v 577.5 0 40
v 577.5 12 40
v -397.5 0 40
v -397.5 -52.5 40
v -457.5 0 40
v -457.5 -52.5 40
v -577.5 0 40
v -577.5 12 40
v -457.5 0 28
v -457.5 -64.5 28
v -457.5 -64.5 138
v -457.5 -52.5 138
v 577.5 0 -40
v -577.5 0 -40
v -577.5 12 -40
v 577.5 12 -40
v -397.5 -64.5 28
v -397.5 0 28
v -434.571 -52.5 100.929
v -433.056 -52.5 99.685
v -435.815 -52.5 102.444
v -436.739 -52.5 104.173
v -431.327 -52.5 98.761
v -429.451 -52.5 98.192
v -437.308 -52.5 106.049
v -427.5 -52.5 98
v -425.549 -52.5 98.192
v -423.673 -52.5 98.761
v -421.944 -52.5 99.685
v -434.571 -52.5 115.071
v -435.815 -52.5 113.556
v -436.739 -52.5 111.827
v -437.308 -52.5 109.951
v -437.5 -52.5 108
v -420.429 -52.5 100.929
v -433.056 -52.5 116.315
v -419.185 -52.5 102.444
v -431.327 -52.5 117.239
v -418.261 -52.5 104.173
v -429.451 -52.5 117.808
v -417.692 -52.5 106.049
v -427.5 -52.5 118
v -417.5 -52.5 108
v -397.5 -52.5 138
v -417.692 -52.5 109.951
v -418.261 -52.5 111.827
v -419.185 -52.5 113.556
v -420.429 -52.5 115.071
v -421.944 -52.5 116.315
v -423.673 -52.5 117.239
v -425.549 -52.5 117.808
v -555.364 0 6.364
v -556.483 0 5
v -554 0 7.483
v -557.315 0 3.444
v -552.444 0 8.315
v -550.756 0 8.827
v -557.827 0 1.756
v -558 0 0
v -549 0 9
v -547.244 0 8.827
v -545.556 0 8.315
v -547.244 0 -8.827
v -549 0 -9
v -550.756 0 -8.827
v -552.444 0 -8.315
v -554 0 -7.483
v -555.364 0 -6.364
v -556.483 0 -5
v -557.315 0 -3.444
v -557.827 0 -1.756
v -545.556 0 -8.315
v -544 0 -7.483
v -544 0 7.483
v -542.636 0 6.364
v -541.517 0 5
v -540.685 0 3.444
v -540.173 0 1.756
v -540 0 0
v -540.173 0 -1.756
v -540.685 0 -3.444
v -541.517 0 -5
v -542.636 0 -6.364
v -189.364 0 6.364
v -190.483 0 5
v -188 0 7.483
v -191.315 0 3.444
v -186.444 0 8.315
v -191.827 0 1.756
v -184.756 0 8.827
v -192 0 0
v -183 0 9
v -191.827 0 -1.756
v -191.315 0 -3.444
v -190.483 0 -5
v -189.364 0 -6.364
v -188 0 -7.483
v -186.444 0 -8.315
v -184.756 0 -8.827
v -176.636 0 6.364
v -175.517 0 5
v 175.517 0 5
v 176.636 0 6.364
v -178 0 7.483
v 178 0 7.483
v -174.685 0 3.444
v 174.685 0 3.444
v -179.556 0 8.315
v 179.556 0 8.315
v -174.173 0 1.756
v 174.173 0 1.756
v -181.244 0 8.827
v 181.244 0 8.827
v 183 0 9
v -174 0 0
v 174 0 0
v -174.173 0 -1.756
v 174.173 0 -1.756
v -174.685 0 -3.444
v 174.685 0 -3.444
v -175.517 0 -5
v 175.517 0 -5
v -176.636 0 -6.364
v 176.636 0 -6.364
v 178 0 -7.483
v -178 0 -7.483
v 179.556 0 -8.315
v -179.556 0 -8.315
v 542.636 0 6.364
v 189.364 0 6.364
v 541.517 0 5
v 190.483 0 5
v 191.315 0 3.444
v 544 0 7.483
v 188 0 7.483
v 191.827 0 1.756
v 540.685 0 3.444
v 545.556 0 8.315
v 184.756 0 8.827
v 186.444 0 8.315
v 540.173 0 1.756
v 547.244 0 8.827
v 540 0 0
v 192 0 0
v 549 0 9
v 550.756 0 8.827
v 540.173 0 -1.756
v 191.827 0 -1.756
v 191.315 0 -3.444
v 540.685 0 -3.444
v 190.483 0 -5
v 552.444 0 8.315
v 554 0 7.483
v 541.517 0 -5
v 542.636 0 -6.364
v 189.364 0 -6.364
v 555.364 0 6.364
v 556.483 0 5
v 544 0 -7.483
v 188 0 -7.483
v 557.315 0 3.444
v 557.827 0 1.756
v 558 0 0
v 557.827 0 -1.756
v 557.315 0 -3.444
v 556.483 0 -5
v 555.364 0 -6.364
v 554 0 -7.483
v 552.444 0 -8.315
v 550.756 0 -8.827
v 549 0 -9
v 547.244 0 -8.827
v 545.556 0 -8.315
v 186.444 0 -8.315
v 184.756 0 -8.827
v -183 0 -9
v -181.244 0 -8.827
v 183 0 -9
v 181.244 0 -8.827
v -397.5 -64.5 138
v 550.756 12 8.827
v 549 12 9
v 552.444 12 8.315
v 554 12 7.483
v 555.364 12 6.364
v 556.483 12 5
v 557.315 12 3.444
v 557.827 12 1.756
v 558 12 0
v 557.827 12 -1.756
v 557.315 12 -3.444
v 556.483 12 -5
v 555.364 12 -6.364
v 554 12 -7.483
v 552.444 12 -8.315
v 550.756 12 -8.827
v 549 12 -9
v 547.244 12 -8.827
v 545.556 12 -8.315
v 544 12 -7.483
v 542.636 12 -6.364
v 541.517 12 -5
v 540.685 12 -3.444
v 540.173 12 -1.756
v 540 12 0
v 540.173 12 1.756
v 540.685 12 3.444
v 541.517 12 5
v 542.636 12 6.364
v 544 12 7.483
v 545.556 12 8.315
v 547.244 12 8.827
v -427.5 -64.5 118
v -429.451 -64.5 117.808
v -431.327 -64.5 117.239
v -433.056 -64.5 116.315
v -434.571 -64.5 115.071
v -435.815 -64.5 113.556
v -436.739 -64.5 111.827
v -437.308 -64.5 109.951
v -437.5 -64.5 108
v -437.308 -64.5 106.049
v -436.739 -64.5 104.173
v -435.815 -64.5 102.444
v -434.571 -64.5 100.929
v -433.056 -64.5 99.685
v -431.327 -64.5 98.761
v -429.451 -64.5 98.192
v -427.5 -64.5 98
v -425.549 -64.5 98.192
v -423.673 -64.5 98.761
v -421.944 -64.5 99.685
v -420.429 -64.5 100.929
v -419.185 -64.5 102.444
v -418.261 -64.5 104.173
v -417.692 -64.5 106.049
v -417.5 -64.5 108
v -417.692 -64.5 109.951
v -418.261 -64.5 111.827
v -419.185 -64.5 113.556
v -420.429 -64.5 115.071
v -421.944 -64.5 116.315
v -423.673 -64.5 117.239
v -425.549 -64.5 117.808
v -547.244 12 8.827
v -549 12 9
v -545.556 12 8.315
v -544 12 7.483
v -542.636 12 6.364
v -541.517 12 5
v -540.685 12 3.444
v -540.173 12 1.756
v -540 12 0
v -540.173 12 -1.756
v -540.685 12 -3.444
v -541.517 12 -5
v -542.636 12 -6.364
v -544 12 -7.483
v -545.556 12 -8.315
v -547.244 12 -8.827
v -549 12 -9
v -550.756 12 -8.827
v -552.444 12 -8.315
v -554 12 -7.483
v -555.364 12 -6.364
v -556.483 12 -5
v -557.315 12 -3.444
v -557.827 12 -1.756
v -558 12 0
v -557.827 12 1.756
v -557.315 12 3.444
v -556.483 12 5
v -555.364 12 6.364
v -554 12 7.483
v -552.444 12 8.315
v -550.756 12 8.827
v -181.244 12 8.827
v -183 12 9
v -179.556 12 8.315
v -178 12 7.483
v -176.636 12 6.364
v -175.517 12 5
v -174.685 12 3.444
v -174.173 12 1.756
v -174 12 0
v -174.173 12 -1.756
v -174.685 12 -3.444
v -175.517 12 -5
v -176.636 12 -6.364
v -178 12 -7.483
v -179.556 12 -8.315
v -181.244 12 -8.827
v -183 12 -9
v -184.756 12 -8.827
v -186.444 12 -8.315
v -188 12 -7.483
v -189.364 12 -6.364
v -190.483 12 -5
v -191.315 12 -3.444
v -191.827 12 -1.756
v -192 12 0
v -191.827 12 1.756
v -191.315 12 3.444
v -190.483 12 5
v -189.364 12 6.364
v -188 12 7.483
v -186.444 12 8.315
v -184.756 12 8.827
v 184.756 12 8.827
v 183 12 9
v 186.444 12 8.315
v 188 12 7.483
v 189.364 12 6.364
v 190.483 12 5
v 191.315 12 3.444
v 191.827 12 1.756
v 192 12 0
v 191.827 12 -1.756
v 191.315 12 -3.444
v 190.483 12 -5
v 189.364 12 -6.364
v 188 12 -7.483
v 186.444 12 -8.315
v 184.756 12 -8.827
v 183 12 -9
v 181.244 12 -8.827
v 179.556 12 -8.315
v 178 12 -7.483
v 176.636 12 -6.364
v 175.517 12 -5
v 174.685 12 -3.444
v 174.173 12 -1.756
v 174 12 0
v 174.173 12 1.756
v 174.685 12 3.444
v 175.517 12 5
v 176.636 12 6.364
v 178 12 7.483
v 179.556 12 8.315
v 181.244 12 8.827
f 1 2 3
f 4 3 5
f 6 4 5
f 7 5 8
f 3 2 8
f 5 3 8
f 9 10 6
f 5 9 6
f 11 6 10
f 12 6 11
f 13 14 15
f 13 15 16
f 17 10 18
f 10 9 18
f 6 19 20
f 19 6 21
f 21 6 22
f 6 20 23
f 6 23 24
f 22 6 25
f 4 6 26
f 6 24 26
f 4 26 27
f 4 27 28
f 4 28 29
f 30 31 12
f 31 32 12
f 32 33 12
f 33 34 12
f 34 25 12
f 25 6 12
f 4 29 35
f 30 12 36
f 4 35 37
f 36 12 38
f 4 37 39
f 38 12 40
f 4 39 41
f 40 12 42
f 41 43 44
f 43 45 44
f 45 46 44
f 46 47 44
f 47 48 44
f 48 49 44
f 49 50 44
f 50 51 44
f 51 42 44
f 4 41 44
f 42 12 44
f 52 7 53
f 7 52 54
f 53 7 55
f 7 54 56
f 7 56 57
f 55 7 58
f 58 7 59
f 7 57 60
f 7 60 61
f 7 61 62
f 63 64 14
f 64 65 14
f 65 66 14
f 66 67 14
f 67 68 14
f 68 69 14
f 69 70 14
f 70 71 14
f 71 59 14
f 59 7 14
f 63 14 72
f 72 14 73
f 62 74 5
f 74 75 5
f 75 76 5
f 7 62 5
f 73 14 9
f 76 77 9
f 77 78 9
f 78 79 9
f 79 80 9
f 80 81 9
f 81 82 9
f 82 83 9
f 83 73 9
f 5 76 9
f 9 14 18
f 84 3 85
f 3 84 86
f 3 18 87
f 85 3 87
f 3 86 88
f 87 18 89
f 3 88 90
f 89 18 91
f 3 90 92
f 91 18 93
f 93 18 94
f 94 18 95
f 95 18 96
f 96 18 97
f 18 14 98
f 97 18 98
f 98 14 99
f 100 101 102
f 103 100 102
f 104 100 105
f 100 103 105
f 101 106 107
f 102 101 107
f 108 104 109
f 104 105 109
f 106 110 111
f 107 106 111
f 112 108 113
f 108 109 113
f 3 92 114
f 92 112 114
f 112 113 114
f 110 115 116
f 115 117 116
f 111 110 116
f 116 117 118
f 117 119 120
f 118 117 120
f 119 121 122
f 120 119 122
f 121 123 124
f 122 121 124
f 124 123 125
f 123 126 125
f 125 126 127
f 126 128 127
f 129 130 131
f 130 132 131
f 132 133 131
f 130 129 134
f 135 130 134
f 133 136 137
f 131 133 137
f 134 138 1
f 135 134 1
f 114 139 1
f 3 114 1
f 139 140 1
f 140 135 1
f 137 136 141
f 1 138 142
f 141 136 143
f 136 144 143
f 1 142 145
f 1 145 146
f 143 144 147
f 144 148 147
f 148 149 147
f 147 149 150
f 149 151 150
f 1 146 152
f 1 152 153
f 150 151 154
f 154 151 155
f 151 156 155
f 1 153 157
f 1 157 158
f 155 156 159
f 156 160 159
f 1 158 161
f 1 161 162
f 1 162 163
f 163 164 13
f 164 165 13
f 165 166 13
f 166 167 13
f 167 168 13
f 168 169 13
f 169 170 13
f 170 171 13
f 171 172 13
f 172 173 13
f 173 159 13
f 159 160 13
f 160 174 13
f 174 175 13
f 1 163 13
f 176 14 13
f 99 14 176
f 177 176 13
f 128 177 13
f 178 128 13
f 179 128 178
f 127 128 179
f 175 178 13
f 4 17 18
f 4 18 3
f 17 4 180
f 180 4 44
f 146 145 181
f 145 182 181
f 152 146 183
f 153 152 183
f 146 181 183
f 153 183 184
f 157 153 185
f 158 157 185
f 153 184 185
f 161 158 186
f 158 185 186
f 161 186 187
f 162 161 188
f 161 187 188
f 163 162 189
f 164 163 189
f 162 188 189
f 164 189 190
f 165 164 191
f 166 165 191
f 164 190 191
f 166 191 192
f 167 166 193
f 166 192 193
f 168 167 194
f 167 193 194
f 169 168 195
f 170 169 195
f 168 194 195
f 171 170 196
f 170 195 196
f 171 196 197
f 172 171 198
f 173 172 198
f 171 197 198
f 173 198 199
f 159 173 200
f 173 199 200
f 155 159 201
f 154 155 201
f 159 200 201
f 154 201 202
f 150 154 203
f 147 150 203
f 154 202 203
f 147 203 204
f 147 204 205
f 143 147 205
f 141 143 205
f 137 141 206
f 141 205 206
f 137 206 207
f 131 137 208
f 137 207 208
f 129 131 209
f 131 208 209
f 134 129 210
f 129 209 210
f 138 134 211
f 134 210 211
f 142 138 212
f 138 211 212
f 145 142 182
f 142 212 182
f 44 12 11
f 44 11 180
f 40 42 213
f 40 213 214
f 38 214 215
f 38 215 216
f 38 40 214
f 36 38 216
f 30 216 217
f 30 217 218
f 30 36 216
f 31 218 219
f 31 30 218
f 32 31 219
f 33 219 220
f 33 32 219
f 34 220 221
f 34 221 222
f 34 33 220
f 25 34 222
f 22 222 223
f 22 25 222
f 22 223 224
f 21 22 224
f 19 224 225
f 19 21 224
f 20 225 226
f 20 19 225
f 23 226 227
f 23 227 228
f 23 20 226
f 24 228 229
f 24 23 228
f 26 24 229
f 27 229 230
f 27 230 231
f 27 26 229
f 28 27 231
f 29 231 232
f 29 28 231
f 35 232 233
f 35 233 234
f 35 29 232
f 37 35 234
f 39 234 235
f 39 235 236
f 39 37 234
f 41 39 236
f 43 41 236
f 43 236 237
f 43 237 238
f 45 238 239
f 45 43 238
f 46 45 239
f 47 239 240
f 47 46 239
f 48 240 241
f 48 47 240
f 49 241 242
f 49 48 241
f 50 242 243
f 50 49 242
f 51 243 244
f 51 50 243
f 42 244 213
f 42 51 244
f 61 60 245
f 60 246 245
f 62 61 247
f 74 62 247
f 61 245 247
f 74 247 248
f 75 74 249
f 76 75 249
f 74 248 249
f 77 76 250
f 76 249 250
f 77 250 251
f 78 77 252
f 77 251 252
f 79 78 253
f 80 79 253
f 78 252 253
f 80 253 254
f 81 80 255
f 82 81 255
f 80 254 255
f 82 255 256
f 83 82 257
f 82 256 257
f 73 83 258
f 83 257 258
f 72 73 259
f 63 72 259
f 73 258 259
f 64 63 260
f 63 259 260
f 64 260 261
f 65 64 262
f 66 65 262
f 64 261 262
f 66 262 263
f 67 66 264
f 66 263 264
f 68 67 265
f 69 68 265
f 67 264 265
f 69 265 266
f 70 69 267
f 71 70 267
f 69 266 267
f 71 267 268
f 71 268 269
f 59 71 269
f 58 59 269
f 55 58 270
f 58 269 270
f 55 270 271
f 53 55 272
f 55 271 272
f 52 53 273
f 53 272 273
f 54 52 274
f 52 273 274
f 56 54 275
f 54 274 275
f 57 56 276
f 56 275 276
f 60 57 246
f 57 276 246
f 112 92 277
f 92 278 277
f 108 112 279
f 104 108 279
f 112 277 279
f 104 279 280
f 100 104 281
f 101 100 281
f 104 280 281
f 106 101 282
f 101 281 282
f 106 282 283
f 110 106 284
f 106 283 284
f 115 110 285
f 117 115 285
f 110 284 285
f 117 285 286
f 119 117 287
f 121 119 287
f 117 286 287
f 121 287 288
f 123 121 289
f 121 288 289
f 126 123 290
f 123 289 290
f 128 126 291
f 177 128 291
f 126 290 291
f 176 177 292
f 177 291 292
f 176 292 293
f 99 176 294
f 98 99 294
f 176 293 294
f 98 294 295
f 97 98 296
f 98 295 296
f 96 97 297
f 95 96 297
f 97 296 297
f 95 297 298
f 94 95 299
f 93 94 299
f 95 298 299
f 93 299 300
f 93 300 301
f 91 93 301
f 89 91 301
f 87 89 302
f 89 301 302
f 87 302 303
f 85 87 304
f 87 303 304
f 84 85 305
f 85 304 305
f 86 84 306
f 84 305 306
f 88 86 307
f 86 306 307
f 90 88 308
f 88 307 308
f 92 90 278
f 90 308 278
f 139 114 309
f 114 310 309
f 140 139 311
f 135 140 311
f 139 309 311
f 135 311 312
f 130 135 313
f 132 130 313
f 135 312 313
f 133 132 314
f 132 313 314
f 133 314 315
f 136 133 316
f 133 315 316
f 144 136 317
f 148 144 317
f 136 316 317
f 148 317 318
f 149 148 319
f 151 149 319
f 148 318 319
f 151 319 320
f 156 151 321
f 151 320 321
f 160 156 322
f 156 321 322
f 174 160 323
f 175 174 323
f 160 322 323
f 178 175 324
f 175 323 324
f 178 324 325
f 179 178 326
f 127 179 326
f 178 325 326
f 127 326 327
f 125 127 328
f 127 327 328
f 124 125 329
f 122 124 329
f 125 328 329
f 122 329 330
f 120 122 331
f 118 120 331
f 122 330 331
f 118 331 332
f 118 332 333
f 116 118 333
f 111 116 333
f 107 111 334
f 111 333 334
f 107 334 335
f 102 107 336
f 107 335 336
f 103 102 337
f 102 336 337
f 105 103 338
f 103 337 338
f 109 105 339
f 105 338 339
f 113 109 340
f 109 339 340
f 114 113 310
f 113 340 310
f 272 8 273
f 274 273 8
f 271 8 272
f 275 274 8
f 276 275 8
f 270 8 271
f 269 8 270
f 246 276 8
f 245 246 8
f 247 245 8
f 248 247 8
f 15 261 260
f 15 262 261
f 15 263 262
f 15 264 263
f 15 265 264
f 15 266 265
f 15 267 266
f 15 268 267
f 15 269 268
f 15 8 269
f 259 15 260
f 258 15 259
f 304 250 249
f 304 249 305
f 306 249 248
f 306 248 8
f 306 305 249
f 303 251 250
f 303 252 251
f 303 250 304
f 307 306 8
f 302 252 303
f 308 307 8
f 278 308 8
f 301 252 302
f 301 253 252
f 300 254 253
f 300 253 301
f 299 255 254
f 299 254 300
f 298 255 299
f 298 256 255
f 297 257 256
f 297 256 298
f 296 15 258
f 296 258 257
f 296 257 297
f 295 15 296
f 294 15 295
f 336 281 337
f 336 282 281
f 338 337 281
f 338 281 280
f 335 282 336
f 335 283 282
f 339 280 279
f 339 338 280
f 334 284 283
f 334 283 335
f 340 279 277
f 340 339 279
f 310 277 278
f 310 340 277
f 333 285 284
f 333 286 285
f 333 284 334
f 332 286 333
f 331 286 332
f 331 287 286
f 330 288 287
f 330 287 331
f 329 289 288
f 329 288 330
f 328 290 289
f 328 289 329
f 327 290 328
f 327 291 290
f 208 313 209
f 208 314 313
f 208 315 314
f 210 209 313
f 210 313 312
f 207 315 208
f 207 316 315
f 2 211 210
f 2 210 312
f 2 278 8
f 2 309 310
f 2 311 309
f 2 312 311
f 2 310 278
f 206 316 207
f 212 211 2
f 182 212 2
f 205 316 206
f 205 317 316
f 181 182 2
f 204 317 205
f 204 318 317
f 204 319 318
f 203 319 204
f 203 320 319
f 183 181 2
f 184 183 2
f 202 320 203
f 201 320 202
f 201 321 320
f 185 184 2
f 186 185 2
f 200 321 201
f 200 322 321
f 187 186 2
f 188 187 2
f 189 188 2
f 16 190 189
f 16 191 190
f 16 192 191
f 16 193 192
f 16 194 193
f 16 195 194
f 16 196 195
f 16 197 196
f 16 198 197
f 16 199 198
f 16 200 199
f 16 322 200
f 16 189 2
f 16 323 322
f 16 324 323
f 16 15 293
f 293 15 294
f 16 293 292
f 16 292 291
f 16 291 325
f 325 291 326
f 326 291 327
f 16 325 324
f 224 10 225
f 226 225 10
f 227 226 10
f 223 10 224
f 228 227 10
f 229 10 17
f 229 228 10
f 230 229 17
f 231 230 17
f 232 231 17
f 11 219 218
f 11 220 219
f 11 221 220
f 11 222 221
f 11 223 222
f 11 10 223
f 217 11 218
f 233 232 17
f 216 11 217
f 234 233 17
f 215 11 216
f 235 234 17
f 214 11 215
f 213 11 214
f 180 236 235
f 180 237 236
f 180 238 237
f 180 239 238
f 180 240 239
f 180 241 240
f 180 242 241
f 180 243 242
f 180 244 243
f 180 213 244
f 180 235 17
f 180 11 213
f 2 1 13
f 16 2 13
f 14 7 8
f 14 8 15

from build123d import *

# Parameters (mm, degrees)
SKETCH1_W           = 1155
SKETCH1_H           = 80
BOSS_EXTRUDE1_DEPTH = 12
SKETCH2_R           = 9
CUT_EXTRUDE1_DEPTH  = 580.007987855
LPATTERN1_COUNT     = 4
LPATTERN1_PITCH     = 366
SKETCH3_W           = 60
SKETCH3_H           = 98
SKETCH3_R           = 10
BOSS_EXTRUDE2_DEPTH = 12
SKETCH4_W           = 60
SKETCH4_H           = 12
BOSS_EXTRUDE3_DEPTH = 52.5
SKETCH6_W           = 60
SKETCH6_H           = 110
SKETCH6_R           = 10
BOSS_EXTRUDE4_DEPTH = 12
SKETCH7_W           = 60
SKETCH7_H           = 98
CUT_EXTRUDE2_DEPTH  = 12


with BuildPart() as part:
    # Sketch1 → Boss-Extrude1 (new body)
    with BuildSketch(Plane(origin=(0, 0, 0), x_dir=(1, 0, 0), z_dir=(0, 1, 0))):
        Rectangle(SKETCH1_W, SKETCH1_H)
    extrude(amount=BOSS_EXTRUDE1_DEPTH)

    # Sketch2 → Cut-Extrude1 (cut, symmetric)
    with BuildSketch(Plane(origin=(0, 12, 0), x_dir=(1, 0, 0), z_dir=(0, 1, 0))):
        with Locations(Location((-549, 0, 0), (0, 0, 270))):
            Circle(SKETCH2_R)
    cut_extrude1 = extrude(amount=CUT_EXTRUDE1_DEPTH, both=True, mode=Mode.SUBTRACT)

    # LPattern1: Cut-Extrude1 ×4
    with Locations(*[(i * LPATTERN1_PITCH, 0, 0) for i in range(1, LPATTERN1_COUNT)]):
        add(cut_extrude1, mode=Mode.SUBTRACT)

    # Sketch3 → Boss-Extrude2 (add)
    with BuildSketch(Plane(origin=(0, 12, 0), x_dir=(1, 0, 0), z_dir=(0, 1, 0))):
        with Locations((-427.5, -89)):
            Rectangle(SKETCH3_W, SKETCH3_H)
        with Locations(Location((-427.5, -108, 0), (0, 0, 270))):
            Circle(SKETCH3_R, mode=Mode.SUBTRACT)
    extrude(amount=-BOSS_EXTRUDE2_DEPTH)

    # Sketch4 → Boss-Extrude3 (add)
    with BuildSketch(Plane(origin=(0, 0, 0), x_dir=(-1, 0, 0), z_dir=(0, -1, 0))):
        with Locations((427.5, -34)):
            Rectangle(SKETCH4_W, SKETCH4_H)
    extrude(amount=BOSS_EXTRUDE3_DEPTH)

    # Sketch6 → Boss-Extrude4 (add)
    with BuildSketch(Plane.XZ.offset(52.5)):
        with Locations((-427.5, 83)):
            Rectangle(SKETCH6_W, SKETCH6_H)
        with Locations(Location((-427.5, 108, 0), (0, 0, 90))):
            Circle(SKETCH6_R, mode=Mode.SUBTRACT)
    extrude(amount=BOSS_EXTRUDE4_DEPTH)

    # Sketch7 → Cut-Extrude2 (cut)
    with BuildSketch(Plane(origin=(0, 12, 0), x_dir=(1, 0, 0), z_dir=(0, 1, 0))):
        with Locations((-427.5, -89)):
            Rectangle(SKETCH7_W, SKETCH7_H)
    extrude(amount=-CUT_EXTRUDE2_DEPTH, mode=Mode.SUBTRACT)


solid = part.part
